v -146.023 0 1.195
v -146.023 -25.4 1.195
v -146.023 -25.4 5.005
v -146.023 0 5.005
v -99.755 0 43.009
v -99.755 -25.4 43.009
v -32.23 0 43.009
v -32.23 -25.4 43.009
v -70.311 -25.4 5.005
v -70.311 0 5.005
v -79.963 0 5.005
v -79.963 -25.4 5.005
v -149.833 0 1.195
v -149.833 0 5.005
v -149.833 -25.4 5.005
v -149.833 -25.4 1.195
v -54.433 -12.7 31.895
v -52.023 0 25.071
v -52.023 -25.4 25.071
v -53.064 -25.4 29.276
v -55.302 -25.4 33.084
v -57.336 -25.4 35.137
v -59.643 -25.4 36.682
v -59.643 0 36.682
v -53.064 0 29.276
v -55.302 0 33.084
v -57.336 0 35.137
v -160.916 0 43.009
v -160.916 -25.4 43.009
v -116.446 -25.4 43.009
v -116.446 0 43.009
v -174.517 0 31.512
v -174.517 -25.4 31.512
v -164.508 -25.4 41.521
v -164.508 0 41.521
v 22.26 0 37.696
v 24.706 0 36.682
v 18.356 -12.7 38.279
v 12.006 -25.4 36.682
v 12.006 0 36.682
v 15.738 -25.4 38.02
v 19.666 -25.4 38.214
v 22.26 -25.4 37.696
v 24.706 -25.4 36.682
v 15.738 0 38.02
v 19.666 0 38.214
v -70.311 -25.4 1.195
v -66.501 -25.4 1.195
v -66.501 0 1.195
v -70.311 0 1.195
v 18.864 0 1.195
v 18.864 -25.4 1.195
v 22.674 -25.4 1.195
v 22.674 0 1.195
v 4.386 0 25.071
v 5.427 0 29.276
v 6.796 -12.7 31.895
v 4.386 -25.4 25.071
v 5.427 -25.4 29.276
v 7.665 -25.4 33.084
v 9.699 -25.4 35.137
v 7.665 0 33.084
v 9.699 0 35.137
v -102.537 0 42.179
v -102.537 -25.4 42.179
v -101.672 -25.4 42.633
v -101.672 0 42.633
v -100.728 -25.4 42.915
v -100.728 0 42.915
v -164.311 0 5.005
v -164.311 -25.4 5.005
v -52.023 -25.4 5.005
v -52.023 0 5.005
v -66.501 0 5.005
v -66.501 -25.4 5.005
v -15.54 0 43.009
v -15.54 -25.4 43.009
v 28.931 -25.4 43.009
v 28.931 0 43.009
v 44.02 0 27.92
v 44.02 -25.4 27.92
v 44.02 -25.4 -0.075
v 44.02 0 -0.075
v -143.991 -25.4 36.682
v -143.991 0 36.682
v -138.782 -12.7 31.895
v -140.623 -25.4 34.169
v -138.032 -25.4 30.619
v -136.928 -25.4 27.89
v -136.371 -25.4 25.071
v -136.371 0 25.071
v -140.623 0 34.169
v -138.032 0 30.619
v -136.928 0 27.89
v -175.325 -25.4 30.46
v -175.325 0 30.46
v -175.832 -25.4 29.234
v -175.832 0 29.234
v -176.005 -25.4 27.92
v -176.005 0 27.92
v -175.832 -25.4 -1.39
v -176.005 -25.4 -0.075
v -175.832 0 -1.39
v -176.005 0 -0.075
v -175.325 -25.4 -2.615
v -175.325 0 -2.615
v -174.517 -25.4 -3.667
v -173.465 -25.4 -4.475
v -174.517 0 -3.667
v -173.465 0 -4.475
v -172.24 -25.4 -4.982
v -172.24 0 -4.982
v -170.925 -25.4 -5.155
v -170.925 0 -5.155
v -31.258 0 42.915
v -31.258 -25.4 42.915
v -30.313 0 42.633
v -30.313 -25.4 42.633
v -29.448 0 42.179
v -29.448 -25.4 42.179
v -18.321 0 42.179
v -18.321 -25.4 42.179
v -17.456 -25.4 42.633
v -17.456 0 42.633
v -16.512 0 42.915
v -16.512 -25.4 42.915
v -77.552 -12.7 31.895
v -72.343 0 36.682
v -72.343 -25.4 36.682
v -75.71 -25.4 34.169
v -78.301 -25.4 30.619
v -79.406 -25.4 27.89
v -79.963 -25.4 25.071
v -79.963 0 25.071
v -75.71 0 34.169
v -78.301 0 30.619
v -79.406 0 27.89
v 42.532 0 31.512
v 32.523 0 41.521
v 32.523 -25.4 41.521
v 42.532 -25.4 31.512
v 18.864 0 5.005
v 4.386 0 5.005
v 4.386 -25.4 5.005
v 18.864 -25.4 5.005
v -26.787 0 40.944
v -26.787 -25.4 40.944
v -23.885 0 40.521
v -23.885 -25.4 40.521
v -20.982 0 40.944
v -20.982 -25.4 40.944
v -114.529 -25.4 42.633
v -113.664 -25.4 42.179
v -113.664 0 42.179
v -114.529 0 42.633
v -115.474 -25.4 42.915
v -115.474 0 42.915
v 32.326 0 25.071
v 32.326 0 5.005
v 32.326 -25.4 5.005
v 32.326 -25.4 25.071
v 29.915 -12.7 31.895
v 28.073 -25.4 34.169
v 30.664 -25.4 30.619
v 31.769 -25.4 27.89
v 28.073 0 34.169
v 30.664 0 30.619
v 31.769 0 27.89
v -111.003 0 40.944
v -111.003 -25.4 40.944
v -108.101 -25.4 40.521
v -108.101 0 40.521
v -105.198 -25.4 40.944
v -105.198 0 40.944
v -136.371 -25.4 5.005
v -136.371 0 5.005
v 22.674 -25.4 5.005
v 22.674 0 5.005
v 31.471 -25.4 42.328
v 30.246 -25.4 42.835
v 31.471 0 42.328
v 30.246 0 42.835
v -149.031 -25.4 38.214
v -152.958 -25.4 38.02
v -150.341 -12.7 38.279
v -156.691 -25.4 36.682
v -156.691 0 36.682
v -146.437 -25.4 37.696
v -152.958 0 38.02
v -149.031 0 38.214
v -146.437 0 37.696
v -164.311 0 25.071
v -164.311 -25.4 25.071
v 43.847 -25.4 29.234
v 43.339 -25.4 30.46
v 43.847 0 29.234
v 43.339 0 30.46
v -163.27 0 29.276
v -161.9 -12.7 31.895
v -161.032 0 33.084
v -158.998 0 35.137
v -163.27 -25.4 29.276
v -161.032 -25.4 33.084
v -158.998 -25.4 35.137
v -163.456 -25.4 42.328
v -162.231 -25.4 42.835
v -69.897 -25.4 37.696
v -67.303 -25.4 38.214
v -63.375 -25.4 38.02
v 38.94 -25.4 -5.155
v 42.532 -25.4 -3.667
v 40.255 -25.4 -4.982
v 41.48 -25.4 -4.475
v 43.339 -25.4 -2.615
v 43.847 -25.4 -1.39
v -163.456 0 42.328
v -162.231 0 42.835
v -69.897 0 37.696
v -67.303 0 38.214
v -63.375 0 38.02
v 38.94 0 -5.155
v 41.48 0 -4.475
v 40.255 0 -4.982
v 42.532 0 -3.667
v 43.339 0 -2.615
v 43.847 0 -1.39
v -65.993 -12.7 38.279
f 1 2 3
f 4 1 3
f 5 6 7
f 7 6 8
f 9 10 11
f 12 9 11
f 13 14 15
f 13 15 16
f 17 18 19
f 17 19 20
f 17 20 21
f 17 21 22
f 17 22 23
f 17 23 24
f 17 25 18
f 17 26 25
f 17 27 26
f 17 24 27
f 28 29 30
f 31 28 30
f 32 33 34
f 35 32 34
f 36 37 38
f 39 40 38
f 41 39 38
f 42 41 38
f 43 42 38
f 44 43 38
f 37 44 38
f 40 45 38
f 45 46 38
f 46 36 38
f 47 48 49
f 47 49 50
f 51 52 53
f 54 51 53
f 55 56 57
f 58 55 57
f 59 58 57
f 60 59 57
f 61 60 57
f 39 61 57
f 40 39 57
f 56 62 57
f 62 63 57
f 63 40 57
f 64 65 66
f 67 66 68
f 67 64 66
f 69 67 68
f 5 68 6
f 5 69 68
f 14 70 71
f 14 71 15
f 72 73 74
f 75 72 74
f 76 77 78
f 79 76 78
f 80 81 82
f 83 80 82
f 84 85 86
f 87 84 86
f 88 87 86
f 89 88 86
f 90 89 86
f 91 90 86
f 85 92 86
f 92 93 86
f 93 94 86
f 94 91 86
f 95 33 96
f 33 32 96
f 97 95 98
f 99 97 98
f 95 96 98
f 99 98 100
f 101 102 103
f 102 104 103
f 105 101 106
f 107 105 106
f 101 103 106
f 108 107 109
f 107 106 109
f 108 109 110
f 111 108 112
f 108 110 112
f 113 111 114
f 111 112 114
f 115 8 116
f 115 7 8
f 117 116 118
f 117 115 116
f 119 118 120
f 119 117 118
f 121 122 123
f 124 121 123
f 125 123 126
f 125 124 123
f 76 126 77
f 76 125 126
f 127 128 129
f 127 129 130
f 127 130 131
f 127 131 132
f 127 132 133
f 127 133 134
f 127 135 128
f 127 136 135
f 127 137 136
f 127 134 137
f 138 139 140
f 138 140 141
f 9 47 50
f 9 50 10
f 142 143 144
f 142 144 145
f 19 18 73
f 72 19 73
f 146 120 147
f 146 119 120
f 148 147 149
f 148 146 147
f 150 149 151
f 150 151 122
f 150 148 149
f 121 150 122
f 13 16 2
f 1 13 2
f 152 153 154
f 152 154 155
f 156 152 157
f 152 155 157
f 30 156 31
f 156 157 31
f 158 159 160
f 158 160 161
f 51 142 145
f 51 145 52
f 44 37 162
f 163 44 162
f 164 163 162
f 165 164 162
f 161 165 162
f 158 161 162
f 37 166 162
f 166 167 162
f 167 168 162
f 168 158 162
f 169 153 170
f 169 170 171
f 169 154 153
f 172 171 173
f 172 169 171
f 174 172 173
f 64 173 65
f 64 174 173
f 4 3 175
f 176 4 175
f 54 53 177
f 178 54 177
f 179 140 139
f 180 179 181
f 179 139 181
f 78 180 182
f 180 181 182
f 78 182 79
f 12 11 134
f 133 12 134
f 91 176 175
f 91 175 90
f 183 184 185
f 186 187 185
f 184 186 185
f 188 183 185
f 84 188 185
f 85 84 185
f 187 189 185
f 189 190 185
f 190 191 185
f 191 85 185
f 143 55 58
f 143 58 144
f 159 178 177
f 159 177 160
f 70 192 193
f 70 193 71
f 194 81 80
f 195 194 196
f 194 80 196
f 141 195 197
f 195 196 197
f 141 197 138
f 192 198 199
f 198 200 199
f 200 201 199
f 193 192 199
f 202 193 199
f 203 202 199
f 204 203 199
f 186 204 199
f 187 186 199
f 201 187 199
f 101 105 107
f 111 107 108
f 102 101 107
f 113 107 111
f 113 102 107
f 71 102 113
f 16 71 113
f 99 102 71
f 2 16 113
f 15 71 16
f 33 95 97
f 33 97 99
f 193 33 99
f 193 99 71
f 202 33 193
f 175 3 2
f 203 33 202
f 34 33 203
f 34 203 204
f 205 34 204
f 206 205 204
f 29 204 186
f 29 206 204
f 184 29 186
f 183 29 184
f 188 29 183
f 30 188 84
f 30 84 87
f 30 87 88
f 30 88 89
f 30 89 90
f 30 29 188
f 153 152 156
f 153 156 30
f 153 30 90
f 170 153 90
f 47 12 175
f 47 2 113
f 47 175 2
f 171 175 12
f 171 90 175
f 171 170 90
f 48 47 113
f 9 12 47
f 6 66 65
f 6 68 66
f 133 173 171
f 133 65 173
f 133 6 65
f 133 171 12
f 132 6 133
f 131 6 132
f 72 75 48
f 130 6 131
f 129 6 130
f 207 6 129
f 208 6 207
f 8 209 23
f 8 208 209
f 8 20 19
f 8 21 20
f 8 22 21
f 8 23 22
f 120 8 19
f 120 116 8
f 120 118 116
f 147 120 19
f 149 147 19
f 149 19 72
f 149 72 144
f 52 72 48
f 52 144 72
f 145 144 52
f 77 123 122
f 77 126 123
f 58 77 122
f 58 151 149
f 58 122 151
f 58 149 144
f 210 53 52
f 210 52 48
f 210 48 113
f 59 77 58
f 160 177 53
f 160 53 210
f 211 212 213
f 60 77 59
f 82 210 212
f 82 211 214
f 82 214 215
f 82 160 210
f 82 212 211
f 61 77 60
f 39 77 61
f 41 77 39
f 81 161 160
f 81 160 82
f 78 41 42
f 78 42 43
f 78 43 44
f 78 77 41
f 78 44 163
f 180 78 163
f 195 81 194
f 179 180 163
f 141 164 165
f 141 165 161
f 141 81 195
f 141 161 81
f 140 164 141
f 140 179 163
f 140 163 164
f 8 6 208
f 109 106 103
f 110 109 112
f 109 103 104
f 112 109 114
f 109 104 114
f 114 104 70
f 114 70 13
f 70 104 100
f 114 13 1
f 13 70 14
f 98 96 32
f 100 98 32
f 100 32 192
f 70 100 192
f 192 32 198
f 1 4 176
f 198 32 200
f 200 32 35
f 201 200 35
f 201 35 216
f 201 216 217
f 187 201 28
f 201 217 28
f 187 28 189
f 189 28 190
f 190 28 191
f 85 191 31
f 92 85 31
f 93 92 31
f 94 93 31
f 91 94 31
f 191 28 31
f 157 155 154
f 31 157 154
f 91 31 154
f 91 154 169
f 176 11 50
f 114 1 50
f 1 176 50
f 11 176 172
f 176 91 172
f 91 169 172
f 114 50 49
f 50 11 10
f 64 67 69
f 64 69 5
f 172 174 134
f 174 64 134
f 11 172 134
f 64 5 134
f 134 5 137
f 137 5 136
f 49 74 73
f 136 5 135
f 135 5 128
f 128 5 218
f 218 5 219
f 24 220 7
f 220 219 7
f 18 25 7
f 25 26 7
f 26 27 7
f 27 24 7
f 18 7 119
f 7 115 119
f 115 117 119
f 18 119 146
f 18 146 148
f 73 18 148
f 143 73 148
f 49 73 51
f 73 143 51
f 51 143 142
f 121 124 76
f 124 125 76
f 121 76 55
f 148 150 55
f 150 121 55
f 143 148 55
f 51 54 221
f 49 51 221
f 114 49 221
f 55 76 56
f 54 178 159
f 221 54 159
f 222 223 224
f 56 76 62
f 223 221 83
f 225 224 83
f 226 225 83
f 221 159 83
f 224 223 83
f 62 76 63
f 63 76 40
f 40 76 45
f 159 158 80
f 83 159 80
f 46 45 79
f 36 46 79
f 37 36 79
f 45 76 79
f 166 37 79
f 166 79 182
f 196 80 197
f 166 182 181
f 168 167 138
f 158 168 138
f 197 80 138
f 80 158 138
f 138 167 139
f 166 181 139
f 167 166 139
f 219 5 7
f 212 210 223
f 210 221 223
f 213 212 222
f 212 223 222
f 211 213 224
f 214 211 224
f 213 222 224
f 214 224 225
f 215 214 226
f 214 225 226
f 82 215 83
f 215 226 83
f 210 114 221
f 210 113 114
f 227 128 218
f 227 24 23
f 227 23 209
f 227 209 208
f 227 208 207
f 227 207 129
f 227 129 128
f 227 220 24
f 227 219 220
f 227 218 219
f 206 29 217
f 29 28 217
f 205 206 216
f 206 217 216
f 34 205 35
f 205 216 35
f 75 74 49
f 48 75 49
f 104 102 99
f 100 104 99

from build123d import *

# Parameters (mm, degrees)
F0_W      = 79.248
F0_H      = 56.769
F1_DEPTH  = 25.4
F2_W      = 2.55016
F2_H      = 56.769
F3_DEPTH  = 25.4
F7_W      = 84.34832
F7_H      = 56.769
F8_DEPTH  = 25.4010001
F10_DEPTH = 25.4010001
F12_DEPTH = 25.4010001
F13_R     = 10.16
F14_R     = 5.08


with BuildPart() as f1:
    # F0 (on Front) → F1 (new body)
    with BuildSketch(Plane.XZ):
        with Locations((-65.9926355079, 23.2293278964)):
            Rectangle(F0_W, F0_H)
        with BuildLine():
            Line((-52.0226355079, 25.0708278964), (-52.0226355079, 5.0048278964))
            Line((-52.0226355079, 5.0048278964), (-66.5006355079, 5.0048278964))
            Line((-66.5006355079, 5.0048278964), (-66.5006355079, 1.1948278964))
            Line((-66.5006355079, 1.1948278964), (-70.3106355079, 1.1948278964))
            Line((-70.3106355079, 1.1948278964), (-70.3106355079, 5.0048278964))
            Line((-70.3106355079, 5.0048278964), (-79.9626355079, 5.0048278964))
            Line((-79.9626355079, 5.0048278964), (-79.9626355079, 25.0708278964))
            add(Edge.make_bspline(
                [(-72.3426355079, 36.6816155863), (-79.143780816, 33.0532444332), (-79.9626355079, 25.0708278964)],
                knots=[0.4689121613, 0.4689121613, 0.4689121613, 1.4631850988, 1.4631850988, 1.4631850988], degree=2, weights=[1, 0.878951812, 1]))
            add(Edge.make_bspline(
                [(-65.9926355079, 38.2788278964), (-69.3487651043, 38.2788278964), (-72.3426355079, 36.6816155863)],
                knots=[0, 0, 0, 0.4689121613, 0.4689121613, 0.4689121613], degree=2, weights=[1, 0.9726408453, 1]))
            add(Edge.make_bspline(
                [(-59.6426355079, 36.6816155863), (-62.6365059115, 38.2788278964), (-65.9926355079, 38.2788278964)],
                knots=[5.8142731459, 5.8142731459, 5.8142731459, 6.2831853072, 6.2831853072, 6.2831853072], degree=2, weights=[1, 0.9726408453, 1]))
            add(Edge.make_bspline(
                [(-52.0226355079, 25.0708278964), (-52.8414901998, 33.0532444332), (-59.6426355079, 36.6816155863)],
                knots=[4.8200002084, 4.8200002084, 4.8200002084, 5.8142731459, 5.8142731459, 5.8142731459], degree=2, weights=[1, 0.878951812, 1]))
        make_face(mode=Mode.SUBTRACT)
    extrude(amount=F1_DEPTH)

    # F2 (on face) → F3 (join, through all)
    with BuildSketch(Plane.XZ.offset(25.4)):
        with Locations((-106.8917155079, 23.2293278964)):
            Rectangle(F2_W, F2_H)
        with Locations((-25.0935555079, 23.2293278964)):
            Rectangle(F2_W, F2_H)
    extrude(amount=-F3_DEPTH)

    # F4: F1 across face


with BuildPart() as f1_1:
    add(f1.part)
    add(f1.part.mirror(Plane(origin=(-108.1667955079, -12.7, 23.2293278964), x_dir=(0, -1, 0), z_dir=(-1, 0, 0))))

    # F5: F1 across face


with BuildPart() as f1_2:
    add(f1_1.part)
    add(f1_1.part.mirror(Plane(origin=(-23.8184755079, -12.7, 23.2293278964), x_dir=(0, 1, 0), z_dir=(1, 0, 0))))

    # F7 (on face) → F8 (cut, through all)
    with BuildSketch(Plane.XZ.offset(25.4)):
        with Locations((102.7040044921, 23.2293278964)):
            Rectangle(F7_W, F7_H)
    extrude(amount=-F8_DEPTH, mode=Mode.SUBTRACT)

    # F9 (on face) → F10 (cut, through all)
    with BuildSketch(Plane.XZ.offset(25.4)):
        Polygon((60.5298444921, -5.1551721036), (60.5298444921, 51.6138278964), (44.0198444921, 51.6138278964), (-176.0051155079, 51.6138278964), (-192.5151155079, 51.6138278964), (-192.5151155079, -5.1551721036), (-176.0051155079, -5.1551721036), (-176.0051155079, 30.0238278964), (-163.0204147545, 43.0085286498), (-133.5769593716, 43.0085286498), (31.0351437387, 43.0085286498), (44.0198444921, 30.0238278964), (44.0198444921, -5.1551721036), align=None)
    extrude(amount=-F10_DEPTH, mode=Mode.SUBTRACT)

    # F11 (on face) → F12 (cut, through all)
    with BuildSketch(Plane.XZ.offset(25.4)):
        Polygon((-30.6416433652, 43.0085286498), (-23.8847362613, 38.2790486498), (-17.1278291575, 43.0085286498), align=None)
        Polygon((-114.8574418583, 43.0085286498), (-108.1005347545, 38.2790486498), (-101.3436276506, 43.0085286498), align=None)
    extrude(amount=-F12_DEPTH, mode=Mode.SUBTRACT)

    # F13
    f13_edges = [f1_2.edges().sort_by_distance(p)[0] for p in [
        (-23.884736, -12.7, 38.279049),
        (-108.100535, -12.7, 38.279049),
    ]]
    fillet(f13_edges, radius=F13_R)

    # F14
    f14_edges = [f1_2.edges().sort_by_distance(p)[0] for p in [
        (-17.127829, -12.7, 43.008529),
        (-30.641643, -12.7, 43.008529),
        (-101.343628, -12.7, 43.008529),
        (-114.857442, -12.7, 43.008529),
        (-163.020415, -12.7, 43.008529),
        (-176.005116, -12.7, 30.023828),
        (31.035144, -12.7, 43.008529),
        (44.019844, -12.7, 30.023828),
        (44.019844, -12.7, -5.155172),
        (-176.005116, -12.7, -5.155172),
    ]]
    fillet(f14_edges, radius=F14_R)


solid = f1_2.part
